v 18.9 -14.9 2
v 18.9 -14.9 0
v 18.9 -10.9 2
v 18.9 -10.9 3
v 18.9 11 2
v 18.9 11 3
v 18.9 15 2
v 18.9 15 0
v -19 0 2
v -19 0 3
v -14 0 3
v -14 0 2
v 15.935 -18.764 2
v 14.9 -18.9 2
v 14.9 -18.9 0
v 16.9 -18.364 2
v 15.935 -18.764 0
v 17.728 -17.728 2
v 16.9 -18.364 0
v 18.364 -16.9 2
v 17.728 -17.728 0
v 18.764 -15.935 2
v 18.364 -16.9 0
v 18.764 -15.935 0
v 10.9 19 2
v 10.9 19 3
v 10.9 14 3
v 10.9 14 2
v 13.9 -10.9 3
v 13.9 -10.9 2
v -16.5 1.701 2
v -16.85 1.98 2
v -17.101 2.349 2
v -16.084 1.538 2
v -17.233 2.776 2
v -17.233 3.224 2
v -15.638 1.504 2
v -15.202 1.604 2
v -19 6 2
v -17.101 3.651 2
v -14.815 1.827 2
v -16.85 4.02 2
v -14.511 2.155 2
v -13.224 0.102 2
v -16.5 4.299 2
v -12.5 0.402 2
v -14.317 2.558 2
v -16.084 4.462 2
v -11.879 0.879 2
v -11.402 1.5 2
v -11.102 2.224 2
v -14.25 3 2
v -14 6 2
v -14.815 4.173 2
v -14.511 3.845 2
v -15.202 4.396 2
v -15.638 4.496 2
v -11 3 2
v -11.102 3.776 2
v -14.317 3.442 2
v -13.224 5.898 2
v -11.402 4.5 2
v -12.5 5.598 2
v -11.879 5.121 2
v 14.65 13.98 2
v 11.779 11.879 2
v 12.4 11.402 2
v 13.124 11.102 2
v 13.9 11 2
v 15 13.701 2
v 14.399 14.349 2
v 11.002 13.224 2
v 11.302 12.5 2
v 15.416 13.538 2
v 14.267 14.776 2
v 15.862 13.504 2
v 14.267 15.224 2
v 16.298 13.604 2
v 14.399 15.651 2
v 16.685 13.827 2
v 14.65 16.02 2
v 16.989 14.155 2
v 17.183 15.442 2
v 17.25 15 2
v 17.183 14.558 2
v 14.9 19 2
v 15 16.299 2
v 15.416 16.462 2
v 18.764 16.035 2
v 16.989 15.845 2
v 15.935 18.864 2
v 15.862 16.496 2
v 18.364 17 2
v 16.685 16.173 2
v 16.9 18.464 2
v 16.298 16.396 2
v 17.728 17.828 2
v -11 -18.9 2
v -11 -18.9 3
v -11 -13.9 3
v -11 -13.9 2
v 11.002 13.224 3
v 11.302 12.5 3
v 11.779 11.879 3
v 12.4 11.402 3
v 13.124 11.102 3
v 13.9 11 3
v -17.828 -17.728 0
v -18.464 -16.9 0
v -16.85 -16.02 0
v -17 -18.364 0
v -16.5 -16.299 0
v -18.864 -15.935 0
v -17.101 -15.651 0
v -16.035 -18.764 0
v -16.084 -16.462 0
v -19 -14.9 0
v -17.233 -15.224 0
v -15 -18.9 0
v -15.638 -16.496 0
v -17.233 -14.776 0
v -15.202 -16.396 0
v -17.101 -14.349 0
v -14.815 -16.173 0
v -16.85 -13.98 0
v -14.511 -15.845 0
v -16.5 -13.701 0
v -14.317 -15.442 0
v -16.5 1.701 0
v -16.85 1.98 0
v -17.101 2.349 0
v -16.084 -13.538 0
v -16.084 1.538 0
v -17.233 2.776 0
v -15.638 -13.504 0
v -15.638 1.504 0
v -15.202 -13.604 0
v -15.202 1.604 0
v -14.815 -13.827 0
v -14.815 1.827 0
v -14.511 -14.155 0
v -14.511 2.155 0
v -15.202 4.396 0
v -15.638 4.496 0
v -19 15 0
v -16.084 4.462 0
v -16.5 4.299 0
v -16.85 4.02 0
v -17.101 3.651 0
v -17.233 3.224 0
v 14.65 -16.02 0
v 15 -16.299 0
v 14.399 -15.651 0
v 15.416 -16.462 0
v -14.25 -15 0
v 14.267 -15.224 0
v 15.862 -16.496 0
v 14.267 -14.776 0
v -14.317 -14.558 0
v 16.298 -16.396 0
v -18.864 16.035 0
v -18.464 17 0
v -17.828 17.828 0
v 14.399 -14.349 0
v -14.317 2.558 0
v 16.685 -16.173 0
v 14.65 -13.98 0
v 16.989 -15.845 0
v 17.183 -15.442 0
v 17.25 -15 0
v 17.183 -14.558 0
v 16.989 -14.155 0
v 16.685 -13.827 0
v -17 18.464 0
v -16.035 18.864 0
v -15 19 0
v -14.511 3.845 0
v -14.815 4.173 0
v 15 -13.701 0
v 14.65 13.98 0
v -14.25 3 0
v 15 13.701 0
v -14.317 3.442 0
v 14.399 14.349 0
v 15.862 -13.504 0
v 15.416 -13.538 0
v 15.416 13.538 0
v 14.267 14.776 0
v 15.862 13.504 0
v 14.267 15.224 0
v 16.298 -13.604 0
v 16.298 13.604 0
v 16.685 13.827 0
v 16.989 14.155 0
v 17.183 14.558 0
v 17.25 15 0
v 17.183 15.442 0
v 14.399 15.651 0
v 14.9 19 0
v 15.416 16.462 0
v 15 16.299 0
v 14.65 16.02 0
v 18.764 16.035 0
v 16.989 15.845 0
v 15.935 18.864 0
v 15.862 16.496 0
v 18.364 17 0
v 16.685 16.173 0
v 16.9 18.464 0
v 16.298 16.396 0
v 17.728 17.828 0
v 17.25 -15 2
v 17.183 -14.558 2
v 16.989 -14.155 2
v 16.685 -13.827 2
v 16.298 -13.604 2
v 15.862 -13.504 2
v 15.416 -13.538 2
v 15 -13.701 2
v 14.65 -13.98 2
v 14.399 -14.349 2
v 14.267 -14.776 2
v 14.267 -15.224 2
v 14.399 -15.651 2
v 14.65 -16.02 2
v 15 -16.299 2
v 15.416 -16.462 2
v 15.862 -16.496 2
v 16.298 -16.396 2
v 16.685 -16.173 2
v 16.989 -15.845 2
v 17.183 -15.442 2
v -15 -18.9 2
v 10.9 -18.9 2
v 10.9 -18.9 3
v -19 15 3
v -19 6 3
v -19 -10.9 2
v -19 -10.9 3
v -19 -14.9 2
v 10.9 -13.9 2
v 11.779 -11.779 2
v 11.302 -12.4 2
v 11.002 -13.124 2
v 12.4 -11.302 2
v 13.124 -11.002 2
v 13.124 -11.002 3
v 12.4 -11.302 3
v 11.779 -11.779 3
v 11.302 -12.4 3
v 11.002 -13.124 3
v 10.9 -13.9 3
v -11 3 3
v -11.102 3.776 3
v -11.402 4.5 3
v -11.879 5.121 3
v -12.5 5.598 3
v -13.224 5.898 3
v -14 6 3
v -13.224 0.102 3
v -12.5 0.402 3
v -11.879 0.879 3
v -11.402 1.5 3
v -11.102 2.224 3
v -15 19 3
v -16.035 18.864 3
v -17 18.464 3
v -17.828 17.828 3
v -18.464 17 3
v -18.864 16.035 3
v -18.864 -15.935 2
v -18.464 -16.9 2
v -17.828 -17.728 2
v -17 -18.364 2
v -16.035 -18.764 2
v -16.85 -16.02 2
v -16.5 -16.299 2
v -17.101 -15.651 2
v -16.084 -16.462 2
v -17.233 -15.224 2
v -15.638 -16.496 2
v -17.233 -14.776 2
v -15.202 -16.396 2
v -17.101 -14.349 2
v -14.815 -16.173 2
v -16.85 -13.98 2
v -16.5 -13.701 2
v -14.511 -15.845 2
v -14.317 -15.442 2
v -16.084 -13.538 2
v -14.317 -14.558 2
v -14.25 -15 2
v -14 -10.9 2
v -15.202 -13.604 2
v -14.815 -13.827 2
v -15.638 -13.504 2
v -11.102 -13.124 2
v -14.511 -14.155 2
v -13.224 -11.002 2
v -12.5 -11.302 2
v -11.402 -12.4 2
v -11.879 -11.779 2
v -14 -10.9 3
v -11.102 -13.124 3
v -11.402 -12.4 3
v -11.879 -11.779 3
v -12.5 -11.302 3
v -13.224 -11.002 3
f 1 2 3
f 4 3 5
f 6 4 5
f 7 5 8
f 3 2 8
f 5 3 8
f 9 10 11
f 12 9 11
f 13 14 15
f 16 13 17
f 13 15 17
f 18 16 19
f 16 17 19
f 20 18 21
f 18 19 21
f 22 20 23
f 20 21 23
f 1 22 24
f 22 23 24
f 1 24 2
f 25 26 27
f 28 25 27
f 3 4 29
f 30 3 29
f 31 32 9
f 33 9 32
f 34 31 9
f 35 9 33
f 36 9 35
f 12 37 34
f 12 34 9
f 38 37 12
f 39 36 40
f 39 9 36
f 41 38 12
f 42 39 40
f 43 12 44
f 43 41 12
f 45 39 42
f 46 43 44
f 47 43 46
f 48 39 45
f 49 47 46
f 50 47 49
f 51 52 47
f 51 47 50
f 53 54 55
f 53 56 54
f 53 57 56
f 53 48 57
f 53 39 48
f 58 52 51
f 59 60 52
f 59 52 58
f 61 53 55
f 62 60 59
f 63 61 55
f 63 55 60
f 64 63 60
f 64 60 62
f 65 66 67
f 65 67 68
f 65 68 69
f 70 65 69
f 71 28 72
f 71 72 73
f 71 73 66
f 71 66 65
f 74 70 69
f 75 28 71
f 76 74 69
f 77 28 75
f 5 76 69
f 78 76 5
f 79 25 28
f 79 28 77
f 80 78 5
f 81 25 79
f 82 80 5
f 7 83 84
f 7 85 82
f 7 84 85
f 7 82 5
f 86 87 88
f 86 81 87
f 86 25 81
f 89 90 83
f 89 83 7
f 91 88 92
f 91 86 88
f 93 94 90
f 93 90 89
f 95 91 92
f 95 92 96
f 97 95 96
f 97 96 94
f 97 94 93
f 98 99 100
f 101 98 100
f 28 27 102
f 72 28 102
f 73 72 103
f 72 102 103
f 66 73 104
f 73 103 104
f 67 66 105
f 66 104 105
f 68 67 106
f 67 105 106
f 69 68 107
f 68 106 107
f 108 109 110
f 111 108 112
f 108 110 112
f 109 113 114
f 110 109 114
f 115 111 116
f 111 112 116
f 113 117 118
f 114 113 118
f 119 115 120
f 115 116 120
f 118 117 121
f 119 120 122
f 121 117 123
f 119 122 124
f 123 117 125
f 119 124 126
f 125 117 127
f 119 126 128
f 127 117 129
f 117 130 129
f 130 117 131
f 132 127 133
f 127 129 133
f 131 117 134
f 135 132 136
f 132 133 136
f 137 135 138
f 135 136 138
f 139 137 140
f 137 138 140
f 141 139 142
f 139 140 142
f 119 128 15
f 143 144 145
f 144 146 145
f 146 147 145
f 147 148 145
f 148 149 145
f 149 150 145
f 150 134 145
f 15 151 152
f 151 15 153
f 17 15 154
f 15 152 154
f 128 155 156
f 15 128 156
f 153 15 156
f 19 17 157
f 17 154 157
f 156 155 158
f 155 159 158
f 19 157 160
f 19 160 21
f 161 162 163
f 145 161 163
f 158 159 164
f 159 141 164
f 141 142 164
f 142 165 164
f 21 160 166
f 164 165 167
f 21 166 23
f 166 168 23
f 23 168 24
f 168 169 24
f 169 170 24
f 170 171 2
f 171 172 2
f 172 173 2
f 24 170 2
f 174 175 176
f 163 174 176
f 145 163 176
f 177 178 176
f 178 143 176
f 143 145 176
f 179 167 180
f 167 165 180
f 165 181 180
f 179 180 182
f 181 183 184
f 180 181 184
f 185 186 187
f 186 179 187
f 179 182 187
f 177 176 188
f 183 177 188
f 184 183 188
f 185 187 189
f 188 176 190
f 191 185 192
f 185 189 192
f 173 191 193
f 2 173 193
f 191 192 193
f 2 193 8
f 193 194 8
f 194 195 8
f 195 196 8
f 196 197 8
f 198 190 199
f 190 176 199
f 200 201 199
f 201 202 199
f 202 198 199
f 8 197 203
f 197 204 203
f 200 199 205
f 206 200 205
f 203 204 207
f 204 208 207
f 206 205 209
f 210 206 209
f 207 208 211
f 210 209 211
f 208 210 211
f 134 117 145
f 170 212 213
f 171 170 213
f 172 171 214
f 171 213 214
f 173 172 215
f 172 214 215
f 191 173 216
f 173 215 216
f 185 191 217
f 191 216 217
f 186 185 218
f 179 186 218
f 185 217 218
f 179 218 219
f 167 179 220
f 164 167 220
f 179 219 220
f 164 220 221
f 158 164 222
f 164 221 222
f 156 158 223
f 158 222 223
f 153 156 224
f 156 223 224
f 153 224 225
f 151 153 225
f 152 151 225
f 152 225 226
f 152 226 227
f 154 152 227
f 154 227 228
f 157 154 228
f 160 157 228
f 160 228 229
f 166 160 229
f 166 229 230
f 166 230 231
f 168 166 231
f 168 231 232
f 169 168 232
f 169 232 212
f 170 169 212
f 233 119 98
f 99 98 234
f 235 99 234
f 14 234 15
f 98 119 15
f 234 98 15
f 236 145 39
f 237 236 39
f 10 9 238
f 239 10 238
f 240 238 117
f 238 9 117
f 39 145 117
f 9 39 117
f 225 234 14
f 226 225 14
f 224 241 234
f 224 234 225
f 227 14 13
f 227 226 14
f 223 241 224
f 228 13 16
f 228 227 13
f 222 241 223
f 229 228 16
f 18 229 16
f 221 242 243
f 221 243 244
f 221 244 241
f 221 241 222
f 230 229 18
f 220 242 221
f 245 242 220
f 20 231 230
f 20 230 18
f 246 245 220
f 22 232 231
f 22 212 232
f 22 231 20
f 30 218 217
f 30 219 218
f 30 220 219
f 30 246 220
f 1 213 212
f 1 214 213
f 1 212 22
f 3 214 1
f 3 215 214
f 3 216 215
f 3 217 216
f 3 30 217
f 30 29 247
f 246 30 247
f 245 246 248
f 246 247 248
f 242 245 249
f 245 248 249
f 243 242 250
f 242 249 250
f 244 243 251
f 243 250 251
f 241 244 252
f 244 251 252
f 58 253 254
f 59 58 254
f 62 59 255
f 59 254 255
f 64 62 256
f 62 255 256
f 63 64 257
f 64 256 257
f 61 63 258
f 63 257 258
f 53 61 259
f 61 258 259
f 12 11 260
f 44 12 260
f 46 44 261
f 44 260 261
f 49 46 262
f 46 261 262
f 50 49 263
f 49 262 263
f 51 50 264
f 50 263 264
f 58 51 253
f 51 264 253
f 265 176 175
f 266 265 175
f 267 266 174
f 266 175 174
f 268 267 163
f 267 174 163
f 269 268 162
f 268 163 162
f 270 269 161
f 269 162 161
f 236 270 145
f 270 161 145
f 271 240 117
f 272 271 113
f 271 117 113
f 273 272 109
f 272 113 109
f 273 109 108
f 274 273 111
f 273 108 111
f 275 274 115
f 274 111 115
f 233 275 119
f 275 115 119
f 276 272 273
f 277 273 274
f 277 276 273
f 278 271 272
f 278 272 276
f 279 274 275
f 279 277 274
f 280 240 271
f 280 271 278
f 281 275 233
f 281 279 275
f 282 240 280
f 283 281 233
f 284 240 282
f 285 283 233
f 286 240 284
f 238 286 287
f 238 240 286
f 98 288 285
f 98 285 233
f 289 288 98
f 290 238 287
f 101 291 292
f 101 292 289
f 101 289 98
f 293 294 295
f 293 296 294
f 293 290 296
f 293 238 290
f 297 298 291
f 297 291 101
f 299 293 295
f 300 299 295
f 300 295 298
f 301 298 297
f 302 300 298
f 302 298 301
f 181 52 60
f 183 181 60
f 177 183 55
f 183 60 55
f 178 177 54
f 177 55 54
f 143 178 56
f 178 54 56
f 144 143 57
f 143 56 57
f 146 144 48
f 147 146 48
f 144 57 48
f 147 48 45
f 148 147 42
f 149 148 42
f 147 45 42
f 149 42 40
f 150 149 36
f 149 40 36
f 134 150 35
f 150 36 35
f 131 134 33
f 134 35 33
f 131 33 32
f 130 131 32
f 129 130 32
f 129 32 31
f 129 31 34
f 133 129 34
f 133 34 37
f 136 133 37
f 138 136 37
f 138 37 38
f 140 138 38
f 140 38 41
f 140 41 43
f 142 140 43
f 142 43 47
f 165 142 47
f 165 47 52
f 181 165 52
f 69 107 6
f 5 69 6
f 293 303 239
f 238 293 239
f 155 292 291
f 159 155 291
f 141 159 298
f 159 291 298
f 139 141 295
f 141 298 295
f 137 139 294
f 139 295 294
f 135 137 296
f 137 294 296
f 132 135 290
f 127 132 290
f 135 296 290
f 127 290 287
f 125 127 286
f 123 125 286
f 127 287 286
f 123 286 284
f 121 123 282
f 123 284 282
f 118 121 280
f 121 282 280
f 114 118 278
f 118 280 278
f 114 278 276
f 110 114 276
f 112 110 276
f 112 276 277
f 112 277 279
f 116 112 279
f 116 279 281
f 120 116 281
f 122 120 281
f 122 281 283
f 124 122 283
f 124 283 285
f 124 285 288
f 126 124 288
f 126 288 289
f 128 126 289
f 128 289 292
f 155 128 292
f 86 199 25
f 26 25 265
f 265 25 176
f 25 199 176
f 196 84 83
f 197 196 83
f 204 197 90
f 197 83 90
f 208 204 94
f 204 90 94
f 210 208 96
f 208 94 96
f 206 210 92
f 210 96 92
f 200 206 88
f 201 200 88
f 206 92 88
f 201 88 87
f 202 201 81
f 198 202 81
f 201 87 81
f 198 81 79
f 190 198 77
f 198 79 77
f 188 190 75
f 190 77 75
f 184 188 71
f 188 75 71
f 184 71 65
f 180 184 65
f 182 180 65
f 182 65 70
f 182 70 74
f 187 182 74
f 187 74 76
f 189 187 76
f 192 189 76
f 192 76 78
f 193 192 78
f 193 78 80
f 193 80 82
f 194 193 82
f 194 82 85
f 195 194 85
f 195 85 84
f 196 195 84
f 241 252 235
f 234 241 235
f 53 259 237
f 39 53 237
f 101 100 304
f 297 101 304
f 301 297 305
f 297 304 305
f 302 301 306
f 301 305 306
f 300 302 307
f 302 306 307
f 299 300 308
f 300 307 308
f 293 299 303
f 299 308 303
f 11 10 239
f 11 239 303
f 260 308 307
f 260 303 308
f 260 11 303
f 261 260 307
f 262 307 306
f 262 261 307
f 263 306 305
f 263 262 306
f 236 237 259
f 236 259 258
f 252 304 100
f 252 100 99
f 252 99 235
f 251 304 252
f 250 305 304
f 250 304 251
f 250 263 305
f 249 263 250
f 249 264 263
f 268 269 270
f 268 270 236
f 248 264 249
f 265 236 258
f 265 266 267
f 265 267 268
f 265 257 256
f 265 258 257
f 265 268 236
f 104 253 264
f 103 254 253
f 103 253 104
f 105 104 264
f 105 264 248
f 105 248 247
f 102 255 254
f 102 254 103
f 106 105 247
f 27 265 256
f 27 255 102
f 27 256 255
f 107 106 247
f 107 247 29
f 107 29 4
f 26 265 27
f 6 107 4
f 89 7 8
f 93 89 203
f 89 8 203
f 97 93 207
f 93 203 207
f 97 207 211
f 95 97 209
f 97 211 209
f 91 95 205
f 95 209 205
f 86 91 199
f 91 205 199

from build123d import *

# Parameters (mm, degrees)
F1_DEPTH = 3
F3_DEPTH = 1
F4_R     = 1.5
F5_DEPTH = 25


with BuildPart() as f1:
    # F0 (on Top) → F1 (new body)
    with BuildSketch(Plane.XY):
        with BuildLine():
            Line((14.9, 19), (-15, 19))
            ThreePointArc((-15, 19), (-17.828427, 17.828427), (-19, 15))
            Line((-19, 15), (-19, -14.9))
            ThreePointArc((-19, -14.9), (-17.828427, -17.728427), (-15, -18.9))
            Line((-15, -18.9), (14.9, -18.9))
            ThreePointArc((14.9, -18.9), (17.728427, -17.728427), (18.9, -14.9))
            Line((18.9, -14.9), (18.9, 15))
            ThreePointArc((18.9, 15), (17.728427, 17.828427), (14.9, 19))
        make_face()
    extrude(amount=F1_DEPTH)

    # F2 (on face) → F3 (cut)
    with BuildSketch(Plane.XY.offset(3)):
        with BuildLine():
            Line((-14, 6), (-19, 6))
            Line((-19, 6), (-19, 0))
            Line((-19, 0), (-14, 0))
            ThreePointArc((-14, 0), (-11.87868, 0.87868), (-11, 3))
            ThreePointArc((-11, 3), (-11.87868, 5.12132), (-14, 6))
        make_face()
        with BuildLine():
            Line((18.9, 19), (10.9, 19))
            Line((10.9, 19), (10.9, 14))
            ThreePointArc((10.9, 14), (11.77868, 11.87868), (13.9, 11))
            Line((13.9, 11), (18.9, 11))
            Line((18.9, 11), (18.9, 19))
        make_face()
        with BuildLine():
            Line((-14, -10.9), (-19, -10.9))
            Line((-19, -10.9), (-19, -18.9))
            Line((-19, -18.9), (-11, -18.9))
            Line((-11, -18.9), (-11, -13.9))
            ThreePointArc((-11, -13.9), (-11.87868, -11.77868), (-14, -10.9))
        make_face()
        with BuildLine():
            Line((18.9, -18.9), (18.9, -10.9))
            Line((18.9, -10.9), (13.9, -10.9))
            ThreePointArc((13.9, -10.9), (11.77868, -11.77868), (10.9, -13.9))
            Line((10.9, -13.9), (10.9, -18.9))
            Line((10.9, -18.9), (18.9, -18.9))
        make_face()
    extrude(amount=-F3_DEPTH, mode=Mode.SUBTRACT)

    # F4 (on face) → F5 (cut)
    with BuildSketch(Plane.XY.offset(2)):
        with Locations((-15.75, 3)):
            Circle(F4_R)
        with Locations((15.75, 15)):
            Circle(F4_R)
        with Locations((15.75, -15)):
            Circle(F4_R)
        with Locations((-15.75, -15)):
            Circle(F4_R)
    extrude(amount=-F5_DEPTH, mode=Mode.SUBTRACT)


solid = f1.part
